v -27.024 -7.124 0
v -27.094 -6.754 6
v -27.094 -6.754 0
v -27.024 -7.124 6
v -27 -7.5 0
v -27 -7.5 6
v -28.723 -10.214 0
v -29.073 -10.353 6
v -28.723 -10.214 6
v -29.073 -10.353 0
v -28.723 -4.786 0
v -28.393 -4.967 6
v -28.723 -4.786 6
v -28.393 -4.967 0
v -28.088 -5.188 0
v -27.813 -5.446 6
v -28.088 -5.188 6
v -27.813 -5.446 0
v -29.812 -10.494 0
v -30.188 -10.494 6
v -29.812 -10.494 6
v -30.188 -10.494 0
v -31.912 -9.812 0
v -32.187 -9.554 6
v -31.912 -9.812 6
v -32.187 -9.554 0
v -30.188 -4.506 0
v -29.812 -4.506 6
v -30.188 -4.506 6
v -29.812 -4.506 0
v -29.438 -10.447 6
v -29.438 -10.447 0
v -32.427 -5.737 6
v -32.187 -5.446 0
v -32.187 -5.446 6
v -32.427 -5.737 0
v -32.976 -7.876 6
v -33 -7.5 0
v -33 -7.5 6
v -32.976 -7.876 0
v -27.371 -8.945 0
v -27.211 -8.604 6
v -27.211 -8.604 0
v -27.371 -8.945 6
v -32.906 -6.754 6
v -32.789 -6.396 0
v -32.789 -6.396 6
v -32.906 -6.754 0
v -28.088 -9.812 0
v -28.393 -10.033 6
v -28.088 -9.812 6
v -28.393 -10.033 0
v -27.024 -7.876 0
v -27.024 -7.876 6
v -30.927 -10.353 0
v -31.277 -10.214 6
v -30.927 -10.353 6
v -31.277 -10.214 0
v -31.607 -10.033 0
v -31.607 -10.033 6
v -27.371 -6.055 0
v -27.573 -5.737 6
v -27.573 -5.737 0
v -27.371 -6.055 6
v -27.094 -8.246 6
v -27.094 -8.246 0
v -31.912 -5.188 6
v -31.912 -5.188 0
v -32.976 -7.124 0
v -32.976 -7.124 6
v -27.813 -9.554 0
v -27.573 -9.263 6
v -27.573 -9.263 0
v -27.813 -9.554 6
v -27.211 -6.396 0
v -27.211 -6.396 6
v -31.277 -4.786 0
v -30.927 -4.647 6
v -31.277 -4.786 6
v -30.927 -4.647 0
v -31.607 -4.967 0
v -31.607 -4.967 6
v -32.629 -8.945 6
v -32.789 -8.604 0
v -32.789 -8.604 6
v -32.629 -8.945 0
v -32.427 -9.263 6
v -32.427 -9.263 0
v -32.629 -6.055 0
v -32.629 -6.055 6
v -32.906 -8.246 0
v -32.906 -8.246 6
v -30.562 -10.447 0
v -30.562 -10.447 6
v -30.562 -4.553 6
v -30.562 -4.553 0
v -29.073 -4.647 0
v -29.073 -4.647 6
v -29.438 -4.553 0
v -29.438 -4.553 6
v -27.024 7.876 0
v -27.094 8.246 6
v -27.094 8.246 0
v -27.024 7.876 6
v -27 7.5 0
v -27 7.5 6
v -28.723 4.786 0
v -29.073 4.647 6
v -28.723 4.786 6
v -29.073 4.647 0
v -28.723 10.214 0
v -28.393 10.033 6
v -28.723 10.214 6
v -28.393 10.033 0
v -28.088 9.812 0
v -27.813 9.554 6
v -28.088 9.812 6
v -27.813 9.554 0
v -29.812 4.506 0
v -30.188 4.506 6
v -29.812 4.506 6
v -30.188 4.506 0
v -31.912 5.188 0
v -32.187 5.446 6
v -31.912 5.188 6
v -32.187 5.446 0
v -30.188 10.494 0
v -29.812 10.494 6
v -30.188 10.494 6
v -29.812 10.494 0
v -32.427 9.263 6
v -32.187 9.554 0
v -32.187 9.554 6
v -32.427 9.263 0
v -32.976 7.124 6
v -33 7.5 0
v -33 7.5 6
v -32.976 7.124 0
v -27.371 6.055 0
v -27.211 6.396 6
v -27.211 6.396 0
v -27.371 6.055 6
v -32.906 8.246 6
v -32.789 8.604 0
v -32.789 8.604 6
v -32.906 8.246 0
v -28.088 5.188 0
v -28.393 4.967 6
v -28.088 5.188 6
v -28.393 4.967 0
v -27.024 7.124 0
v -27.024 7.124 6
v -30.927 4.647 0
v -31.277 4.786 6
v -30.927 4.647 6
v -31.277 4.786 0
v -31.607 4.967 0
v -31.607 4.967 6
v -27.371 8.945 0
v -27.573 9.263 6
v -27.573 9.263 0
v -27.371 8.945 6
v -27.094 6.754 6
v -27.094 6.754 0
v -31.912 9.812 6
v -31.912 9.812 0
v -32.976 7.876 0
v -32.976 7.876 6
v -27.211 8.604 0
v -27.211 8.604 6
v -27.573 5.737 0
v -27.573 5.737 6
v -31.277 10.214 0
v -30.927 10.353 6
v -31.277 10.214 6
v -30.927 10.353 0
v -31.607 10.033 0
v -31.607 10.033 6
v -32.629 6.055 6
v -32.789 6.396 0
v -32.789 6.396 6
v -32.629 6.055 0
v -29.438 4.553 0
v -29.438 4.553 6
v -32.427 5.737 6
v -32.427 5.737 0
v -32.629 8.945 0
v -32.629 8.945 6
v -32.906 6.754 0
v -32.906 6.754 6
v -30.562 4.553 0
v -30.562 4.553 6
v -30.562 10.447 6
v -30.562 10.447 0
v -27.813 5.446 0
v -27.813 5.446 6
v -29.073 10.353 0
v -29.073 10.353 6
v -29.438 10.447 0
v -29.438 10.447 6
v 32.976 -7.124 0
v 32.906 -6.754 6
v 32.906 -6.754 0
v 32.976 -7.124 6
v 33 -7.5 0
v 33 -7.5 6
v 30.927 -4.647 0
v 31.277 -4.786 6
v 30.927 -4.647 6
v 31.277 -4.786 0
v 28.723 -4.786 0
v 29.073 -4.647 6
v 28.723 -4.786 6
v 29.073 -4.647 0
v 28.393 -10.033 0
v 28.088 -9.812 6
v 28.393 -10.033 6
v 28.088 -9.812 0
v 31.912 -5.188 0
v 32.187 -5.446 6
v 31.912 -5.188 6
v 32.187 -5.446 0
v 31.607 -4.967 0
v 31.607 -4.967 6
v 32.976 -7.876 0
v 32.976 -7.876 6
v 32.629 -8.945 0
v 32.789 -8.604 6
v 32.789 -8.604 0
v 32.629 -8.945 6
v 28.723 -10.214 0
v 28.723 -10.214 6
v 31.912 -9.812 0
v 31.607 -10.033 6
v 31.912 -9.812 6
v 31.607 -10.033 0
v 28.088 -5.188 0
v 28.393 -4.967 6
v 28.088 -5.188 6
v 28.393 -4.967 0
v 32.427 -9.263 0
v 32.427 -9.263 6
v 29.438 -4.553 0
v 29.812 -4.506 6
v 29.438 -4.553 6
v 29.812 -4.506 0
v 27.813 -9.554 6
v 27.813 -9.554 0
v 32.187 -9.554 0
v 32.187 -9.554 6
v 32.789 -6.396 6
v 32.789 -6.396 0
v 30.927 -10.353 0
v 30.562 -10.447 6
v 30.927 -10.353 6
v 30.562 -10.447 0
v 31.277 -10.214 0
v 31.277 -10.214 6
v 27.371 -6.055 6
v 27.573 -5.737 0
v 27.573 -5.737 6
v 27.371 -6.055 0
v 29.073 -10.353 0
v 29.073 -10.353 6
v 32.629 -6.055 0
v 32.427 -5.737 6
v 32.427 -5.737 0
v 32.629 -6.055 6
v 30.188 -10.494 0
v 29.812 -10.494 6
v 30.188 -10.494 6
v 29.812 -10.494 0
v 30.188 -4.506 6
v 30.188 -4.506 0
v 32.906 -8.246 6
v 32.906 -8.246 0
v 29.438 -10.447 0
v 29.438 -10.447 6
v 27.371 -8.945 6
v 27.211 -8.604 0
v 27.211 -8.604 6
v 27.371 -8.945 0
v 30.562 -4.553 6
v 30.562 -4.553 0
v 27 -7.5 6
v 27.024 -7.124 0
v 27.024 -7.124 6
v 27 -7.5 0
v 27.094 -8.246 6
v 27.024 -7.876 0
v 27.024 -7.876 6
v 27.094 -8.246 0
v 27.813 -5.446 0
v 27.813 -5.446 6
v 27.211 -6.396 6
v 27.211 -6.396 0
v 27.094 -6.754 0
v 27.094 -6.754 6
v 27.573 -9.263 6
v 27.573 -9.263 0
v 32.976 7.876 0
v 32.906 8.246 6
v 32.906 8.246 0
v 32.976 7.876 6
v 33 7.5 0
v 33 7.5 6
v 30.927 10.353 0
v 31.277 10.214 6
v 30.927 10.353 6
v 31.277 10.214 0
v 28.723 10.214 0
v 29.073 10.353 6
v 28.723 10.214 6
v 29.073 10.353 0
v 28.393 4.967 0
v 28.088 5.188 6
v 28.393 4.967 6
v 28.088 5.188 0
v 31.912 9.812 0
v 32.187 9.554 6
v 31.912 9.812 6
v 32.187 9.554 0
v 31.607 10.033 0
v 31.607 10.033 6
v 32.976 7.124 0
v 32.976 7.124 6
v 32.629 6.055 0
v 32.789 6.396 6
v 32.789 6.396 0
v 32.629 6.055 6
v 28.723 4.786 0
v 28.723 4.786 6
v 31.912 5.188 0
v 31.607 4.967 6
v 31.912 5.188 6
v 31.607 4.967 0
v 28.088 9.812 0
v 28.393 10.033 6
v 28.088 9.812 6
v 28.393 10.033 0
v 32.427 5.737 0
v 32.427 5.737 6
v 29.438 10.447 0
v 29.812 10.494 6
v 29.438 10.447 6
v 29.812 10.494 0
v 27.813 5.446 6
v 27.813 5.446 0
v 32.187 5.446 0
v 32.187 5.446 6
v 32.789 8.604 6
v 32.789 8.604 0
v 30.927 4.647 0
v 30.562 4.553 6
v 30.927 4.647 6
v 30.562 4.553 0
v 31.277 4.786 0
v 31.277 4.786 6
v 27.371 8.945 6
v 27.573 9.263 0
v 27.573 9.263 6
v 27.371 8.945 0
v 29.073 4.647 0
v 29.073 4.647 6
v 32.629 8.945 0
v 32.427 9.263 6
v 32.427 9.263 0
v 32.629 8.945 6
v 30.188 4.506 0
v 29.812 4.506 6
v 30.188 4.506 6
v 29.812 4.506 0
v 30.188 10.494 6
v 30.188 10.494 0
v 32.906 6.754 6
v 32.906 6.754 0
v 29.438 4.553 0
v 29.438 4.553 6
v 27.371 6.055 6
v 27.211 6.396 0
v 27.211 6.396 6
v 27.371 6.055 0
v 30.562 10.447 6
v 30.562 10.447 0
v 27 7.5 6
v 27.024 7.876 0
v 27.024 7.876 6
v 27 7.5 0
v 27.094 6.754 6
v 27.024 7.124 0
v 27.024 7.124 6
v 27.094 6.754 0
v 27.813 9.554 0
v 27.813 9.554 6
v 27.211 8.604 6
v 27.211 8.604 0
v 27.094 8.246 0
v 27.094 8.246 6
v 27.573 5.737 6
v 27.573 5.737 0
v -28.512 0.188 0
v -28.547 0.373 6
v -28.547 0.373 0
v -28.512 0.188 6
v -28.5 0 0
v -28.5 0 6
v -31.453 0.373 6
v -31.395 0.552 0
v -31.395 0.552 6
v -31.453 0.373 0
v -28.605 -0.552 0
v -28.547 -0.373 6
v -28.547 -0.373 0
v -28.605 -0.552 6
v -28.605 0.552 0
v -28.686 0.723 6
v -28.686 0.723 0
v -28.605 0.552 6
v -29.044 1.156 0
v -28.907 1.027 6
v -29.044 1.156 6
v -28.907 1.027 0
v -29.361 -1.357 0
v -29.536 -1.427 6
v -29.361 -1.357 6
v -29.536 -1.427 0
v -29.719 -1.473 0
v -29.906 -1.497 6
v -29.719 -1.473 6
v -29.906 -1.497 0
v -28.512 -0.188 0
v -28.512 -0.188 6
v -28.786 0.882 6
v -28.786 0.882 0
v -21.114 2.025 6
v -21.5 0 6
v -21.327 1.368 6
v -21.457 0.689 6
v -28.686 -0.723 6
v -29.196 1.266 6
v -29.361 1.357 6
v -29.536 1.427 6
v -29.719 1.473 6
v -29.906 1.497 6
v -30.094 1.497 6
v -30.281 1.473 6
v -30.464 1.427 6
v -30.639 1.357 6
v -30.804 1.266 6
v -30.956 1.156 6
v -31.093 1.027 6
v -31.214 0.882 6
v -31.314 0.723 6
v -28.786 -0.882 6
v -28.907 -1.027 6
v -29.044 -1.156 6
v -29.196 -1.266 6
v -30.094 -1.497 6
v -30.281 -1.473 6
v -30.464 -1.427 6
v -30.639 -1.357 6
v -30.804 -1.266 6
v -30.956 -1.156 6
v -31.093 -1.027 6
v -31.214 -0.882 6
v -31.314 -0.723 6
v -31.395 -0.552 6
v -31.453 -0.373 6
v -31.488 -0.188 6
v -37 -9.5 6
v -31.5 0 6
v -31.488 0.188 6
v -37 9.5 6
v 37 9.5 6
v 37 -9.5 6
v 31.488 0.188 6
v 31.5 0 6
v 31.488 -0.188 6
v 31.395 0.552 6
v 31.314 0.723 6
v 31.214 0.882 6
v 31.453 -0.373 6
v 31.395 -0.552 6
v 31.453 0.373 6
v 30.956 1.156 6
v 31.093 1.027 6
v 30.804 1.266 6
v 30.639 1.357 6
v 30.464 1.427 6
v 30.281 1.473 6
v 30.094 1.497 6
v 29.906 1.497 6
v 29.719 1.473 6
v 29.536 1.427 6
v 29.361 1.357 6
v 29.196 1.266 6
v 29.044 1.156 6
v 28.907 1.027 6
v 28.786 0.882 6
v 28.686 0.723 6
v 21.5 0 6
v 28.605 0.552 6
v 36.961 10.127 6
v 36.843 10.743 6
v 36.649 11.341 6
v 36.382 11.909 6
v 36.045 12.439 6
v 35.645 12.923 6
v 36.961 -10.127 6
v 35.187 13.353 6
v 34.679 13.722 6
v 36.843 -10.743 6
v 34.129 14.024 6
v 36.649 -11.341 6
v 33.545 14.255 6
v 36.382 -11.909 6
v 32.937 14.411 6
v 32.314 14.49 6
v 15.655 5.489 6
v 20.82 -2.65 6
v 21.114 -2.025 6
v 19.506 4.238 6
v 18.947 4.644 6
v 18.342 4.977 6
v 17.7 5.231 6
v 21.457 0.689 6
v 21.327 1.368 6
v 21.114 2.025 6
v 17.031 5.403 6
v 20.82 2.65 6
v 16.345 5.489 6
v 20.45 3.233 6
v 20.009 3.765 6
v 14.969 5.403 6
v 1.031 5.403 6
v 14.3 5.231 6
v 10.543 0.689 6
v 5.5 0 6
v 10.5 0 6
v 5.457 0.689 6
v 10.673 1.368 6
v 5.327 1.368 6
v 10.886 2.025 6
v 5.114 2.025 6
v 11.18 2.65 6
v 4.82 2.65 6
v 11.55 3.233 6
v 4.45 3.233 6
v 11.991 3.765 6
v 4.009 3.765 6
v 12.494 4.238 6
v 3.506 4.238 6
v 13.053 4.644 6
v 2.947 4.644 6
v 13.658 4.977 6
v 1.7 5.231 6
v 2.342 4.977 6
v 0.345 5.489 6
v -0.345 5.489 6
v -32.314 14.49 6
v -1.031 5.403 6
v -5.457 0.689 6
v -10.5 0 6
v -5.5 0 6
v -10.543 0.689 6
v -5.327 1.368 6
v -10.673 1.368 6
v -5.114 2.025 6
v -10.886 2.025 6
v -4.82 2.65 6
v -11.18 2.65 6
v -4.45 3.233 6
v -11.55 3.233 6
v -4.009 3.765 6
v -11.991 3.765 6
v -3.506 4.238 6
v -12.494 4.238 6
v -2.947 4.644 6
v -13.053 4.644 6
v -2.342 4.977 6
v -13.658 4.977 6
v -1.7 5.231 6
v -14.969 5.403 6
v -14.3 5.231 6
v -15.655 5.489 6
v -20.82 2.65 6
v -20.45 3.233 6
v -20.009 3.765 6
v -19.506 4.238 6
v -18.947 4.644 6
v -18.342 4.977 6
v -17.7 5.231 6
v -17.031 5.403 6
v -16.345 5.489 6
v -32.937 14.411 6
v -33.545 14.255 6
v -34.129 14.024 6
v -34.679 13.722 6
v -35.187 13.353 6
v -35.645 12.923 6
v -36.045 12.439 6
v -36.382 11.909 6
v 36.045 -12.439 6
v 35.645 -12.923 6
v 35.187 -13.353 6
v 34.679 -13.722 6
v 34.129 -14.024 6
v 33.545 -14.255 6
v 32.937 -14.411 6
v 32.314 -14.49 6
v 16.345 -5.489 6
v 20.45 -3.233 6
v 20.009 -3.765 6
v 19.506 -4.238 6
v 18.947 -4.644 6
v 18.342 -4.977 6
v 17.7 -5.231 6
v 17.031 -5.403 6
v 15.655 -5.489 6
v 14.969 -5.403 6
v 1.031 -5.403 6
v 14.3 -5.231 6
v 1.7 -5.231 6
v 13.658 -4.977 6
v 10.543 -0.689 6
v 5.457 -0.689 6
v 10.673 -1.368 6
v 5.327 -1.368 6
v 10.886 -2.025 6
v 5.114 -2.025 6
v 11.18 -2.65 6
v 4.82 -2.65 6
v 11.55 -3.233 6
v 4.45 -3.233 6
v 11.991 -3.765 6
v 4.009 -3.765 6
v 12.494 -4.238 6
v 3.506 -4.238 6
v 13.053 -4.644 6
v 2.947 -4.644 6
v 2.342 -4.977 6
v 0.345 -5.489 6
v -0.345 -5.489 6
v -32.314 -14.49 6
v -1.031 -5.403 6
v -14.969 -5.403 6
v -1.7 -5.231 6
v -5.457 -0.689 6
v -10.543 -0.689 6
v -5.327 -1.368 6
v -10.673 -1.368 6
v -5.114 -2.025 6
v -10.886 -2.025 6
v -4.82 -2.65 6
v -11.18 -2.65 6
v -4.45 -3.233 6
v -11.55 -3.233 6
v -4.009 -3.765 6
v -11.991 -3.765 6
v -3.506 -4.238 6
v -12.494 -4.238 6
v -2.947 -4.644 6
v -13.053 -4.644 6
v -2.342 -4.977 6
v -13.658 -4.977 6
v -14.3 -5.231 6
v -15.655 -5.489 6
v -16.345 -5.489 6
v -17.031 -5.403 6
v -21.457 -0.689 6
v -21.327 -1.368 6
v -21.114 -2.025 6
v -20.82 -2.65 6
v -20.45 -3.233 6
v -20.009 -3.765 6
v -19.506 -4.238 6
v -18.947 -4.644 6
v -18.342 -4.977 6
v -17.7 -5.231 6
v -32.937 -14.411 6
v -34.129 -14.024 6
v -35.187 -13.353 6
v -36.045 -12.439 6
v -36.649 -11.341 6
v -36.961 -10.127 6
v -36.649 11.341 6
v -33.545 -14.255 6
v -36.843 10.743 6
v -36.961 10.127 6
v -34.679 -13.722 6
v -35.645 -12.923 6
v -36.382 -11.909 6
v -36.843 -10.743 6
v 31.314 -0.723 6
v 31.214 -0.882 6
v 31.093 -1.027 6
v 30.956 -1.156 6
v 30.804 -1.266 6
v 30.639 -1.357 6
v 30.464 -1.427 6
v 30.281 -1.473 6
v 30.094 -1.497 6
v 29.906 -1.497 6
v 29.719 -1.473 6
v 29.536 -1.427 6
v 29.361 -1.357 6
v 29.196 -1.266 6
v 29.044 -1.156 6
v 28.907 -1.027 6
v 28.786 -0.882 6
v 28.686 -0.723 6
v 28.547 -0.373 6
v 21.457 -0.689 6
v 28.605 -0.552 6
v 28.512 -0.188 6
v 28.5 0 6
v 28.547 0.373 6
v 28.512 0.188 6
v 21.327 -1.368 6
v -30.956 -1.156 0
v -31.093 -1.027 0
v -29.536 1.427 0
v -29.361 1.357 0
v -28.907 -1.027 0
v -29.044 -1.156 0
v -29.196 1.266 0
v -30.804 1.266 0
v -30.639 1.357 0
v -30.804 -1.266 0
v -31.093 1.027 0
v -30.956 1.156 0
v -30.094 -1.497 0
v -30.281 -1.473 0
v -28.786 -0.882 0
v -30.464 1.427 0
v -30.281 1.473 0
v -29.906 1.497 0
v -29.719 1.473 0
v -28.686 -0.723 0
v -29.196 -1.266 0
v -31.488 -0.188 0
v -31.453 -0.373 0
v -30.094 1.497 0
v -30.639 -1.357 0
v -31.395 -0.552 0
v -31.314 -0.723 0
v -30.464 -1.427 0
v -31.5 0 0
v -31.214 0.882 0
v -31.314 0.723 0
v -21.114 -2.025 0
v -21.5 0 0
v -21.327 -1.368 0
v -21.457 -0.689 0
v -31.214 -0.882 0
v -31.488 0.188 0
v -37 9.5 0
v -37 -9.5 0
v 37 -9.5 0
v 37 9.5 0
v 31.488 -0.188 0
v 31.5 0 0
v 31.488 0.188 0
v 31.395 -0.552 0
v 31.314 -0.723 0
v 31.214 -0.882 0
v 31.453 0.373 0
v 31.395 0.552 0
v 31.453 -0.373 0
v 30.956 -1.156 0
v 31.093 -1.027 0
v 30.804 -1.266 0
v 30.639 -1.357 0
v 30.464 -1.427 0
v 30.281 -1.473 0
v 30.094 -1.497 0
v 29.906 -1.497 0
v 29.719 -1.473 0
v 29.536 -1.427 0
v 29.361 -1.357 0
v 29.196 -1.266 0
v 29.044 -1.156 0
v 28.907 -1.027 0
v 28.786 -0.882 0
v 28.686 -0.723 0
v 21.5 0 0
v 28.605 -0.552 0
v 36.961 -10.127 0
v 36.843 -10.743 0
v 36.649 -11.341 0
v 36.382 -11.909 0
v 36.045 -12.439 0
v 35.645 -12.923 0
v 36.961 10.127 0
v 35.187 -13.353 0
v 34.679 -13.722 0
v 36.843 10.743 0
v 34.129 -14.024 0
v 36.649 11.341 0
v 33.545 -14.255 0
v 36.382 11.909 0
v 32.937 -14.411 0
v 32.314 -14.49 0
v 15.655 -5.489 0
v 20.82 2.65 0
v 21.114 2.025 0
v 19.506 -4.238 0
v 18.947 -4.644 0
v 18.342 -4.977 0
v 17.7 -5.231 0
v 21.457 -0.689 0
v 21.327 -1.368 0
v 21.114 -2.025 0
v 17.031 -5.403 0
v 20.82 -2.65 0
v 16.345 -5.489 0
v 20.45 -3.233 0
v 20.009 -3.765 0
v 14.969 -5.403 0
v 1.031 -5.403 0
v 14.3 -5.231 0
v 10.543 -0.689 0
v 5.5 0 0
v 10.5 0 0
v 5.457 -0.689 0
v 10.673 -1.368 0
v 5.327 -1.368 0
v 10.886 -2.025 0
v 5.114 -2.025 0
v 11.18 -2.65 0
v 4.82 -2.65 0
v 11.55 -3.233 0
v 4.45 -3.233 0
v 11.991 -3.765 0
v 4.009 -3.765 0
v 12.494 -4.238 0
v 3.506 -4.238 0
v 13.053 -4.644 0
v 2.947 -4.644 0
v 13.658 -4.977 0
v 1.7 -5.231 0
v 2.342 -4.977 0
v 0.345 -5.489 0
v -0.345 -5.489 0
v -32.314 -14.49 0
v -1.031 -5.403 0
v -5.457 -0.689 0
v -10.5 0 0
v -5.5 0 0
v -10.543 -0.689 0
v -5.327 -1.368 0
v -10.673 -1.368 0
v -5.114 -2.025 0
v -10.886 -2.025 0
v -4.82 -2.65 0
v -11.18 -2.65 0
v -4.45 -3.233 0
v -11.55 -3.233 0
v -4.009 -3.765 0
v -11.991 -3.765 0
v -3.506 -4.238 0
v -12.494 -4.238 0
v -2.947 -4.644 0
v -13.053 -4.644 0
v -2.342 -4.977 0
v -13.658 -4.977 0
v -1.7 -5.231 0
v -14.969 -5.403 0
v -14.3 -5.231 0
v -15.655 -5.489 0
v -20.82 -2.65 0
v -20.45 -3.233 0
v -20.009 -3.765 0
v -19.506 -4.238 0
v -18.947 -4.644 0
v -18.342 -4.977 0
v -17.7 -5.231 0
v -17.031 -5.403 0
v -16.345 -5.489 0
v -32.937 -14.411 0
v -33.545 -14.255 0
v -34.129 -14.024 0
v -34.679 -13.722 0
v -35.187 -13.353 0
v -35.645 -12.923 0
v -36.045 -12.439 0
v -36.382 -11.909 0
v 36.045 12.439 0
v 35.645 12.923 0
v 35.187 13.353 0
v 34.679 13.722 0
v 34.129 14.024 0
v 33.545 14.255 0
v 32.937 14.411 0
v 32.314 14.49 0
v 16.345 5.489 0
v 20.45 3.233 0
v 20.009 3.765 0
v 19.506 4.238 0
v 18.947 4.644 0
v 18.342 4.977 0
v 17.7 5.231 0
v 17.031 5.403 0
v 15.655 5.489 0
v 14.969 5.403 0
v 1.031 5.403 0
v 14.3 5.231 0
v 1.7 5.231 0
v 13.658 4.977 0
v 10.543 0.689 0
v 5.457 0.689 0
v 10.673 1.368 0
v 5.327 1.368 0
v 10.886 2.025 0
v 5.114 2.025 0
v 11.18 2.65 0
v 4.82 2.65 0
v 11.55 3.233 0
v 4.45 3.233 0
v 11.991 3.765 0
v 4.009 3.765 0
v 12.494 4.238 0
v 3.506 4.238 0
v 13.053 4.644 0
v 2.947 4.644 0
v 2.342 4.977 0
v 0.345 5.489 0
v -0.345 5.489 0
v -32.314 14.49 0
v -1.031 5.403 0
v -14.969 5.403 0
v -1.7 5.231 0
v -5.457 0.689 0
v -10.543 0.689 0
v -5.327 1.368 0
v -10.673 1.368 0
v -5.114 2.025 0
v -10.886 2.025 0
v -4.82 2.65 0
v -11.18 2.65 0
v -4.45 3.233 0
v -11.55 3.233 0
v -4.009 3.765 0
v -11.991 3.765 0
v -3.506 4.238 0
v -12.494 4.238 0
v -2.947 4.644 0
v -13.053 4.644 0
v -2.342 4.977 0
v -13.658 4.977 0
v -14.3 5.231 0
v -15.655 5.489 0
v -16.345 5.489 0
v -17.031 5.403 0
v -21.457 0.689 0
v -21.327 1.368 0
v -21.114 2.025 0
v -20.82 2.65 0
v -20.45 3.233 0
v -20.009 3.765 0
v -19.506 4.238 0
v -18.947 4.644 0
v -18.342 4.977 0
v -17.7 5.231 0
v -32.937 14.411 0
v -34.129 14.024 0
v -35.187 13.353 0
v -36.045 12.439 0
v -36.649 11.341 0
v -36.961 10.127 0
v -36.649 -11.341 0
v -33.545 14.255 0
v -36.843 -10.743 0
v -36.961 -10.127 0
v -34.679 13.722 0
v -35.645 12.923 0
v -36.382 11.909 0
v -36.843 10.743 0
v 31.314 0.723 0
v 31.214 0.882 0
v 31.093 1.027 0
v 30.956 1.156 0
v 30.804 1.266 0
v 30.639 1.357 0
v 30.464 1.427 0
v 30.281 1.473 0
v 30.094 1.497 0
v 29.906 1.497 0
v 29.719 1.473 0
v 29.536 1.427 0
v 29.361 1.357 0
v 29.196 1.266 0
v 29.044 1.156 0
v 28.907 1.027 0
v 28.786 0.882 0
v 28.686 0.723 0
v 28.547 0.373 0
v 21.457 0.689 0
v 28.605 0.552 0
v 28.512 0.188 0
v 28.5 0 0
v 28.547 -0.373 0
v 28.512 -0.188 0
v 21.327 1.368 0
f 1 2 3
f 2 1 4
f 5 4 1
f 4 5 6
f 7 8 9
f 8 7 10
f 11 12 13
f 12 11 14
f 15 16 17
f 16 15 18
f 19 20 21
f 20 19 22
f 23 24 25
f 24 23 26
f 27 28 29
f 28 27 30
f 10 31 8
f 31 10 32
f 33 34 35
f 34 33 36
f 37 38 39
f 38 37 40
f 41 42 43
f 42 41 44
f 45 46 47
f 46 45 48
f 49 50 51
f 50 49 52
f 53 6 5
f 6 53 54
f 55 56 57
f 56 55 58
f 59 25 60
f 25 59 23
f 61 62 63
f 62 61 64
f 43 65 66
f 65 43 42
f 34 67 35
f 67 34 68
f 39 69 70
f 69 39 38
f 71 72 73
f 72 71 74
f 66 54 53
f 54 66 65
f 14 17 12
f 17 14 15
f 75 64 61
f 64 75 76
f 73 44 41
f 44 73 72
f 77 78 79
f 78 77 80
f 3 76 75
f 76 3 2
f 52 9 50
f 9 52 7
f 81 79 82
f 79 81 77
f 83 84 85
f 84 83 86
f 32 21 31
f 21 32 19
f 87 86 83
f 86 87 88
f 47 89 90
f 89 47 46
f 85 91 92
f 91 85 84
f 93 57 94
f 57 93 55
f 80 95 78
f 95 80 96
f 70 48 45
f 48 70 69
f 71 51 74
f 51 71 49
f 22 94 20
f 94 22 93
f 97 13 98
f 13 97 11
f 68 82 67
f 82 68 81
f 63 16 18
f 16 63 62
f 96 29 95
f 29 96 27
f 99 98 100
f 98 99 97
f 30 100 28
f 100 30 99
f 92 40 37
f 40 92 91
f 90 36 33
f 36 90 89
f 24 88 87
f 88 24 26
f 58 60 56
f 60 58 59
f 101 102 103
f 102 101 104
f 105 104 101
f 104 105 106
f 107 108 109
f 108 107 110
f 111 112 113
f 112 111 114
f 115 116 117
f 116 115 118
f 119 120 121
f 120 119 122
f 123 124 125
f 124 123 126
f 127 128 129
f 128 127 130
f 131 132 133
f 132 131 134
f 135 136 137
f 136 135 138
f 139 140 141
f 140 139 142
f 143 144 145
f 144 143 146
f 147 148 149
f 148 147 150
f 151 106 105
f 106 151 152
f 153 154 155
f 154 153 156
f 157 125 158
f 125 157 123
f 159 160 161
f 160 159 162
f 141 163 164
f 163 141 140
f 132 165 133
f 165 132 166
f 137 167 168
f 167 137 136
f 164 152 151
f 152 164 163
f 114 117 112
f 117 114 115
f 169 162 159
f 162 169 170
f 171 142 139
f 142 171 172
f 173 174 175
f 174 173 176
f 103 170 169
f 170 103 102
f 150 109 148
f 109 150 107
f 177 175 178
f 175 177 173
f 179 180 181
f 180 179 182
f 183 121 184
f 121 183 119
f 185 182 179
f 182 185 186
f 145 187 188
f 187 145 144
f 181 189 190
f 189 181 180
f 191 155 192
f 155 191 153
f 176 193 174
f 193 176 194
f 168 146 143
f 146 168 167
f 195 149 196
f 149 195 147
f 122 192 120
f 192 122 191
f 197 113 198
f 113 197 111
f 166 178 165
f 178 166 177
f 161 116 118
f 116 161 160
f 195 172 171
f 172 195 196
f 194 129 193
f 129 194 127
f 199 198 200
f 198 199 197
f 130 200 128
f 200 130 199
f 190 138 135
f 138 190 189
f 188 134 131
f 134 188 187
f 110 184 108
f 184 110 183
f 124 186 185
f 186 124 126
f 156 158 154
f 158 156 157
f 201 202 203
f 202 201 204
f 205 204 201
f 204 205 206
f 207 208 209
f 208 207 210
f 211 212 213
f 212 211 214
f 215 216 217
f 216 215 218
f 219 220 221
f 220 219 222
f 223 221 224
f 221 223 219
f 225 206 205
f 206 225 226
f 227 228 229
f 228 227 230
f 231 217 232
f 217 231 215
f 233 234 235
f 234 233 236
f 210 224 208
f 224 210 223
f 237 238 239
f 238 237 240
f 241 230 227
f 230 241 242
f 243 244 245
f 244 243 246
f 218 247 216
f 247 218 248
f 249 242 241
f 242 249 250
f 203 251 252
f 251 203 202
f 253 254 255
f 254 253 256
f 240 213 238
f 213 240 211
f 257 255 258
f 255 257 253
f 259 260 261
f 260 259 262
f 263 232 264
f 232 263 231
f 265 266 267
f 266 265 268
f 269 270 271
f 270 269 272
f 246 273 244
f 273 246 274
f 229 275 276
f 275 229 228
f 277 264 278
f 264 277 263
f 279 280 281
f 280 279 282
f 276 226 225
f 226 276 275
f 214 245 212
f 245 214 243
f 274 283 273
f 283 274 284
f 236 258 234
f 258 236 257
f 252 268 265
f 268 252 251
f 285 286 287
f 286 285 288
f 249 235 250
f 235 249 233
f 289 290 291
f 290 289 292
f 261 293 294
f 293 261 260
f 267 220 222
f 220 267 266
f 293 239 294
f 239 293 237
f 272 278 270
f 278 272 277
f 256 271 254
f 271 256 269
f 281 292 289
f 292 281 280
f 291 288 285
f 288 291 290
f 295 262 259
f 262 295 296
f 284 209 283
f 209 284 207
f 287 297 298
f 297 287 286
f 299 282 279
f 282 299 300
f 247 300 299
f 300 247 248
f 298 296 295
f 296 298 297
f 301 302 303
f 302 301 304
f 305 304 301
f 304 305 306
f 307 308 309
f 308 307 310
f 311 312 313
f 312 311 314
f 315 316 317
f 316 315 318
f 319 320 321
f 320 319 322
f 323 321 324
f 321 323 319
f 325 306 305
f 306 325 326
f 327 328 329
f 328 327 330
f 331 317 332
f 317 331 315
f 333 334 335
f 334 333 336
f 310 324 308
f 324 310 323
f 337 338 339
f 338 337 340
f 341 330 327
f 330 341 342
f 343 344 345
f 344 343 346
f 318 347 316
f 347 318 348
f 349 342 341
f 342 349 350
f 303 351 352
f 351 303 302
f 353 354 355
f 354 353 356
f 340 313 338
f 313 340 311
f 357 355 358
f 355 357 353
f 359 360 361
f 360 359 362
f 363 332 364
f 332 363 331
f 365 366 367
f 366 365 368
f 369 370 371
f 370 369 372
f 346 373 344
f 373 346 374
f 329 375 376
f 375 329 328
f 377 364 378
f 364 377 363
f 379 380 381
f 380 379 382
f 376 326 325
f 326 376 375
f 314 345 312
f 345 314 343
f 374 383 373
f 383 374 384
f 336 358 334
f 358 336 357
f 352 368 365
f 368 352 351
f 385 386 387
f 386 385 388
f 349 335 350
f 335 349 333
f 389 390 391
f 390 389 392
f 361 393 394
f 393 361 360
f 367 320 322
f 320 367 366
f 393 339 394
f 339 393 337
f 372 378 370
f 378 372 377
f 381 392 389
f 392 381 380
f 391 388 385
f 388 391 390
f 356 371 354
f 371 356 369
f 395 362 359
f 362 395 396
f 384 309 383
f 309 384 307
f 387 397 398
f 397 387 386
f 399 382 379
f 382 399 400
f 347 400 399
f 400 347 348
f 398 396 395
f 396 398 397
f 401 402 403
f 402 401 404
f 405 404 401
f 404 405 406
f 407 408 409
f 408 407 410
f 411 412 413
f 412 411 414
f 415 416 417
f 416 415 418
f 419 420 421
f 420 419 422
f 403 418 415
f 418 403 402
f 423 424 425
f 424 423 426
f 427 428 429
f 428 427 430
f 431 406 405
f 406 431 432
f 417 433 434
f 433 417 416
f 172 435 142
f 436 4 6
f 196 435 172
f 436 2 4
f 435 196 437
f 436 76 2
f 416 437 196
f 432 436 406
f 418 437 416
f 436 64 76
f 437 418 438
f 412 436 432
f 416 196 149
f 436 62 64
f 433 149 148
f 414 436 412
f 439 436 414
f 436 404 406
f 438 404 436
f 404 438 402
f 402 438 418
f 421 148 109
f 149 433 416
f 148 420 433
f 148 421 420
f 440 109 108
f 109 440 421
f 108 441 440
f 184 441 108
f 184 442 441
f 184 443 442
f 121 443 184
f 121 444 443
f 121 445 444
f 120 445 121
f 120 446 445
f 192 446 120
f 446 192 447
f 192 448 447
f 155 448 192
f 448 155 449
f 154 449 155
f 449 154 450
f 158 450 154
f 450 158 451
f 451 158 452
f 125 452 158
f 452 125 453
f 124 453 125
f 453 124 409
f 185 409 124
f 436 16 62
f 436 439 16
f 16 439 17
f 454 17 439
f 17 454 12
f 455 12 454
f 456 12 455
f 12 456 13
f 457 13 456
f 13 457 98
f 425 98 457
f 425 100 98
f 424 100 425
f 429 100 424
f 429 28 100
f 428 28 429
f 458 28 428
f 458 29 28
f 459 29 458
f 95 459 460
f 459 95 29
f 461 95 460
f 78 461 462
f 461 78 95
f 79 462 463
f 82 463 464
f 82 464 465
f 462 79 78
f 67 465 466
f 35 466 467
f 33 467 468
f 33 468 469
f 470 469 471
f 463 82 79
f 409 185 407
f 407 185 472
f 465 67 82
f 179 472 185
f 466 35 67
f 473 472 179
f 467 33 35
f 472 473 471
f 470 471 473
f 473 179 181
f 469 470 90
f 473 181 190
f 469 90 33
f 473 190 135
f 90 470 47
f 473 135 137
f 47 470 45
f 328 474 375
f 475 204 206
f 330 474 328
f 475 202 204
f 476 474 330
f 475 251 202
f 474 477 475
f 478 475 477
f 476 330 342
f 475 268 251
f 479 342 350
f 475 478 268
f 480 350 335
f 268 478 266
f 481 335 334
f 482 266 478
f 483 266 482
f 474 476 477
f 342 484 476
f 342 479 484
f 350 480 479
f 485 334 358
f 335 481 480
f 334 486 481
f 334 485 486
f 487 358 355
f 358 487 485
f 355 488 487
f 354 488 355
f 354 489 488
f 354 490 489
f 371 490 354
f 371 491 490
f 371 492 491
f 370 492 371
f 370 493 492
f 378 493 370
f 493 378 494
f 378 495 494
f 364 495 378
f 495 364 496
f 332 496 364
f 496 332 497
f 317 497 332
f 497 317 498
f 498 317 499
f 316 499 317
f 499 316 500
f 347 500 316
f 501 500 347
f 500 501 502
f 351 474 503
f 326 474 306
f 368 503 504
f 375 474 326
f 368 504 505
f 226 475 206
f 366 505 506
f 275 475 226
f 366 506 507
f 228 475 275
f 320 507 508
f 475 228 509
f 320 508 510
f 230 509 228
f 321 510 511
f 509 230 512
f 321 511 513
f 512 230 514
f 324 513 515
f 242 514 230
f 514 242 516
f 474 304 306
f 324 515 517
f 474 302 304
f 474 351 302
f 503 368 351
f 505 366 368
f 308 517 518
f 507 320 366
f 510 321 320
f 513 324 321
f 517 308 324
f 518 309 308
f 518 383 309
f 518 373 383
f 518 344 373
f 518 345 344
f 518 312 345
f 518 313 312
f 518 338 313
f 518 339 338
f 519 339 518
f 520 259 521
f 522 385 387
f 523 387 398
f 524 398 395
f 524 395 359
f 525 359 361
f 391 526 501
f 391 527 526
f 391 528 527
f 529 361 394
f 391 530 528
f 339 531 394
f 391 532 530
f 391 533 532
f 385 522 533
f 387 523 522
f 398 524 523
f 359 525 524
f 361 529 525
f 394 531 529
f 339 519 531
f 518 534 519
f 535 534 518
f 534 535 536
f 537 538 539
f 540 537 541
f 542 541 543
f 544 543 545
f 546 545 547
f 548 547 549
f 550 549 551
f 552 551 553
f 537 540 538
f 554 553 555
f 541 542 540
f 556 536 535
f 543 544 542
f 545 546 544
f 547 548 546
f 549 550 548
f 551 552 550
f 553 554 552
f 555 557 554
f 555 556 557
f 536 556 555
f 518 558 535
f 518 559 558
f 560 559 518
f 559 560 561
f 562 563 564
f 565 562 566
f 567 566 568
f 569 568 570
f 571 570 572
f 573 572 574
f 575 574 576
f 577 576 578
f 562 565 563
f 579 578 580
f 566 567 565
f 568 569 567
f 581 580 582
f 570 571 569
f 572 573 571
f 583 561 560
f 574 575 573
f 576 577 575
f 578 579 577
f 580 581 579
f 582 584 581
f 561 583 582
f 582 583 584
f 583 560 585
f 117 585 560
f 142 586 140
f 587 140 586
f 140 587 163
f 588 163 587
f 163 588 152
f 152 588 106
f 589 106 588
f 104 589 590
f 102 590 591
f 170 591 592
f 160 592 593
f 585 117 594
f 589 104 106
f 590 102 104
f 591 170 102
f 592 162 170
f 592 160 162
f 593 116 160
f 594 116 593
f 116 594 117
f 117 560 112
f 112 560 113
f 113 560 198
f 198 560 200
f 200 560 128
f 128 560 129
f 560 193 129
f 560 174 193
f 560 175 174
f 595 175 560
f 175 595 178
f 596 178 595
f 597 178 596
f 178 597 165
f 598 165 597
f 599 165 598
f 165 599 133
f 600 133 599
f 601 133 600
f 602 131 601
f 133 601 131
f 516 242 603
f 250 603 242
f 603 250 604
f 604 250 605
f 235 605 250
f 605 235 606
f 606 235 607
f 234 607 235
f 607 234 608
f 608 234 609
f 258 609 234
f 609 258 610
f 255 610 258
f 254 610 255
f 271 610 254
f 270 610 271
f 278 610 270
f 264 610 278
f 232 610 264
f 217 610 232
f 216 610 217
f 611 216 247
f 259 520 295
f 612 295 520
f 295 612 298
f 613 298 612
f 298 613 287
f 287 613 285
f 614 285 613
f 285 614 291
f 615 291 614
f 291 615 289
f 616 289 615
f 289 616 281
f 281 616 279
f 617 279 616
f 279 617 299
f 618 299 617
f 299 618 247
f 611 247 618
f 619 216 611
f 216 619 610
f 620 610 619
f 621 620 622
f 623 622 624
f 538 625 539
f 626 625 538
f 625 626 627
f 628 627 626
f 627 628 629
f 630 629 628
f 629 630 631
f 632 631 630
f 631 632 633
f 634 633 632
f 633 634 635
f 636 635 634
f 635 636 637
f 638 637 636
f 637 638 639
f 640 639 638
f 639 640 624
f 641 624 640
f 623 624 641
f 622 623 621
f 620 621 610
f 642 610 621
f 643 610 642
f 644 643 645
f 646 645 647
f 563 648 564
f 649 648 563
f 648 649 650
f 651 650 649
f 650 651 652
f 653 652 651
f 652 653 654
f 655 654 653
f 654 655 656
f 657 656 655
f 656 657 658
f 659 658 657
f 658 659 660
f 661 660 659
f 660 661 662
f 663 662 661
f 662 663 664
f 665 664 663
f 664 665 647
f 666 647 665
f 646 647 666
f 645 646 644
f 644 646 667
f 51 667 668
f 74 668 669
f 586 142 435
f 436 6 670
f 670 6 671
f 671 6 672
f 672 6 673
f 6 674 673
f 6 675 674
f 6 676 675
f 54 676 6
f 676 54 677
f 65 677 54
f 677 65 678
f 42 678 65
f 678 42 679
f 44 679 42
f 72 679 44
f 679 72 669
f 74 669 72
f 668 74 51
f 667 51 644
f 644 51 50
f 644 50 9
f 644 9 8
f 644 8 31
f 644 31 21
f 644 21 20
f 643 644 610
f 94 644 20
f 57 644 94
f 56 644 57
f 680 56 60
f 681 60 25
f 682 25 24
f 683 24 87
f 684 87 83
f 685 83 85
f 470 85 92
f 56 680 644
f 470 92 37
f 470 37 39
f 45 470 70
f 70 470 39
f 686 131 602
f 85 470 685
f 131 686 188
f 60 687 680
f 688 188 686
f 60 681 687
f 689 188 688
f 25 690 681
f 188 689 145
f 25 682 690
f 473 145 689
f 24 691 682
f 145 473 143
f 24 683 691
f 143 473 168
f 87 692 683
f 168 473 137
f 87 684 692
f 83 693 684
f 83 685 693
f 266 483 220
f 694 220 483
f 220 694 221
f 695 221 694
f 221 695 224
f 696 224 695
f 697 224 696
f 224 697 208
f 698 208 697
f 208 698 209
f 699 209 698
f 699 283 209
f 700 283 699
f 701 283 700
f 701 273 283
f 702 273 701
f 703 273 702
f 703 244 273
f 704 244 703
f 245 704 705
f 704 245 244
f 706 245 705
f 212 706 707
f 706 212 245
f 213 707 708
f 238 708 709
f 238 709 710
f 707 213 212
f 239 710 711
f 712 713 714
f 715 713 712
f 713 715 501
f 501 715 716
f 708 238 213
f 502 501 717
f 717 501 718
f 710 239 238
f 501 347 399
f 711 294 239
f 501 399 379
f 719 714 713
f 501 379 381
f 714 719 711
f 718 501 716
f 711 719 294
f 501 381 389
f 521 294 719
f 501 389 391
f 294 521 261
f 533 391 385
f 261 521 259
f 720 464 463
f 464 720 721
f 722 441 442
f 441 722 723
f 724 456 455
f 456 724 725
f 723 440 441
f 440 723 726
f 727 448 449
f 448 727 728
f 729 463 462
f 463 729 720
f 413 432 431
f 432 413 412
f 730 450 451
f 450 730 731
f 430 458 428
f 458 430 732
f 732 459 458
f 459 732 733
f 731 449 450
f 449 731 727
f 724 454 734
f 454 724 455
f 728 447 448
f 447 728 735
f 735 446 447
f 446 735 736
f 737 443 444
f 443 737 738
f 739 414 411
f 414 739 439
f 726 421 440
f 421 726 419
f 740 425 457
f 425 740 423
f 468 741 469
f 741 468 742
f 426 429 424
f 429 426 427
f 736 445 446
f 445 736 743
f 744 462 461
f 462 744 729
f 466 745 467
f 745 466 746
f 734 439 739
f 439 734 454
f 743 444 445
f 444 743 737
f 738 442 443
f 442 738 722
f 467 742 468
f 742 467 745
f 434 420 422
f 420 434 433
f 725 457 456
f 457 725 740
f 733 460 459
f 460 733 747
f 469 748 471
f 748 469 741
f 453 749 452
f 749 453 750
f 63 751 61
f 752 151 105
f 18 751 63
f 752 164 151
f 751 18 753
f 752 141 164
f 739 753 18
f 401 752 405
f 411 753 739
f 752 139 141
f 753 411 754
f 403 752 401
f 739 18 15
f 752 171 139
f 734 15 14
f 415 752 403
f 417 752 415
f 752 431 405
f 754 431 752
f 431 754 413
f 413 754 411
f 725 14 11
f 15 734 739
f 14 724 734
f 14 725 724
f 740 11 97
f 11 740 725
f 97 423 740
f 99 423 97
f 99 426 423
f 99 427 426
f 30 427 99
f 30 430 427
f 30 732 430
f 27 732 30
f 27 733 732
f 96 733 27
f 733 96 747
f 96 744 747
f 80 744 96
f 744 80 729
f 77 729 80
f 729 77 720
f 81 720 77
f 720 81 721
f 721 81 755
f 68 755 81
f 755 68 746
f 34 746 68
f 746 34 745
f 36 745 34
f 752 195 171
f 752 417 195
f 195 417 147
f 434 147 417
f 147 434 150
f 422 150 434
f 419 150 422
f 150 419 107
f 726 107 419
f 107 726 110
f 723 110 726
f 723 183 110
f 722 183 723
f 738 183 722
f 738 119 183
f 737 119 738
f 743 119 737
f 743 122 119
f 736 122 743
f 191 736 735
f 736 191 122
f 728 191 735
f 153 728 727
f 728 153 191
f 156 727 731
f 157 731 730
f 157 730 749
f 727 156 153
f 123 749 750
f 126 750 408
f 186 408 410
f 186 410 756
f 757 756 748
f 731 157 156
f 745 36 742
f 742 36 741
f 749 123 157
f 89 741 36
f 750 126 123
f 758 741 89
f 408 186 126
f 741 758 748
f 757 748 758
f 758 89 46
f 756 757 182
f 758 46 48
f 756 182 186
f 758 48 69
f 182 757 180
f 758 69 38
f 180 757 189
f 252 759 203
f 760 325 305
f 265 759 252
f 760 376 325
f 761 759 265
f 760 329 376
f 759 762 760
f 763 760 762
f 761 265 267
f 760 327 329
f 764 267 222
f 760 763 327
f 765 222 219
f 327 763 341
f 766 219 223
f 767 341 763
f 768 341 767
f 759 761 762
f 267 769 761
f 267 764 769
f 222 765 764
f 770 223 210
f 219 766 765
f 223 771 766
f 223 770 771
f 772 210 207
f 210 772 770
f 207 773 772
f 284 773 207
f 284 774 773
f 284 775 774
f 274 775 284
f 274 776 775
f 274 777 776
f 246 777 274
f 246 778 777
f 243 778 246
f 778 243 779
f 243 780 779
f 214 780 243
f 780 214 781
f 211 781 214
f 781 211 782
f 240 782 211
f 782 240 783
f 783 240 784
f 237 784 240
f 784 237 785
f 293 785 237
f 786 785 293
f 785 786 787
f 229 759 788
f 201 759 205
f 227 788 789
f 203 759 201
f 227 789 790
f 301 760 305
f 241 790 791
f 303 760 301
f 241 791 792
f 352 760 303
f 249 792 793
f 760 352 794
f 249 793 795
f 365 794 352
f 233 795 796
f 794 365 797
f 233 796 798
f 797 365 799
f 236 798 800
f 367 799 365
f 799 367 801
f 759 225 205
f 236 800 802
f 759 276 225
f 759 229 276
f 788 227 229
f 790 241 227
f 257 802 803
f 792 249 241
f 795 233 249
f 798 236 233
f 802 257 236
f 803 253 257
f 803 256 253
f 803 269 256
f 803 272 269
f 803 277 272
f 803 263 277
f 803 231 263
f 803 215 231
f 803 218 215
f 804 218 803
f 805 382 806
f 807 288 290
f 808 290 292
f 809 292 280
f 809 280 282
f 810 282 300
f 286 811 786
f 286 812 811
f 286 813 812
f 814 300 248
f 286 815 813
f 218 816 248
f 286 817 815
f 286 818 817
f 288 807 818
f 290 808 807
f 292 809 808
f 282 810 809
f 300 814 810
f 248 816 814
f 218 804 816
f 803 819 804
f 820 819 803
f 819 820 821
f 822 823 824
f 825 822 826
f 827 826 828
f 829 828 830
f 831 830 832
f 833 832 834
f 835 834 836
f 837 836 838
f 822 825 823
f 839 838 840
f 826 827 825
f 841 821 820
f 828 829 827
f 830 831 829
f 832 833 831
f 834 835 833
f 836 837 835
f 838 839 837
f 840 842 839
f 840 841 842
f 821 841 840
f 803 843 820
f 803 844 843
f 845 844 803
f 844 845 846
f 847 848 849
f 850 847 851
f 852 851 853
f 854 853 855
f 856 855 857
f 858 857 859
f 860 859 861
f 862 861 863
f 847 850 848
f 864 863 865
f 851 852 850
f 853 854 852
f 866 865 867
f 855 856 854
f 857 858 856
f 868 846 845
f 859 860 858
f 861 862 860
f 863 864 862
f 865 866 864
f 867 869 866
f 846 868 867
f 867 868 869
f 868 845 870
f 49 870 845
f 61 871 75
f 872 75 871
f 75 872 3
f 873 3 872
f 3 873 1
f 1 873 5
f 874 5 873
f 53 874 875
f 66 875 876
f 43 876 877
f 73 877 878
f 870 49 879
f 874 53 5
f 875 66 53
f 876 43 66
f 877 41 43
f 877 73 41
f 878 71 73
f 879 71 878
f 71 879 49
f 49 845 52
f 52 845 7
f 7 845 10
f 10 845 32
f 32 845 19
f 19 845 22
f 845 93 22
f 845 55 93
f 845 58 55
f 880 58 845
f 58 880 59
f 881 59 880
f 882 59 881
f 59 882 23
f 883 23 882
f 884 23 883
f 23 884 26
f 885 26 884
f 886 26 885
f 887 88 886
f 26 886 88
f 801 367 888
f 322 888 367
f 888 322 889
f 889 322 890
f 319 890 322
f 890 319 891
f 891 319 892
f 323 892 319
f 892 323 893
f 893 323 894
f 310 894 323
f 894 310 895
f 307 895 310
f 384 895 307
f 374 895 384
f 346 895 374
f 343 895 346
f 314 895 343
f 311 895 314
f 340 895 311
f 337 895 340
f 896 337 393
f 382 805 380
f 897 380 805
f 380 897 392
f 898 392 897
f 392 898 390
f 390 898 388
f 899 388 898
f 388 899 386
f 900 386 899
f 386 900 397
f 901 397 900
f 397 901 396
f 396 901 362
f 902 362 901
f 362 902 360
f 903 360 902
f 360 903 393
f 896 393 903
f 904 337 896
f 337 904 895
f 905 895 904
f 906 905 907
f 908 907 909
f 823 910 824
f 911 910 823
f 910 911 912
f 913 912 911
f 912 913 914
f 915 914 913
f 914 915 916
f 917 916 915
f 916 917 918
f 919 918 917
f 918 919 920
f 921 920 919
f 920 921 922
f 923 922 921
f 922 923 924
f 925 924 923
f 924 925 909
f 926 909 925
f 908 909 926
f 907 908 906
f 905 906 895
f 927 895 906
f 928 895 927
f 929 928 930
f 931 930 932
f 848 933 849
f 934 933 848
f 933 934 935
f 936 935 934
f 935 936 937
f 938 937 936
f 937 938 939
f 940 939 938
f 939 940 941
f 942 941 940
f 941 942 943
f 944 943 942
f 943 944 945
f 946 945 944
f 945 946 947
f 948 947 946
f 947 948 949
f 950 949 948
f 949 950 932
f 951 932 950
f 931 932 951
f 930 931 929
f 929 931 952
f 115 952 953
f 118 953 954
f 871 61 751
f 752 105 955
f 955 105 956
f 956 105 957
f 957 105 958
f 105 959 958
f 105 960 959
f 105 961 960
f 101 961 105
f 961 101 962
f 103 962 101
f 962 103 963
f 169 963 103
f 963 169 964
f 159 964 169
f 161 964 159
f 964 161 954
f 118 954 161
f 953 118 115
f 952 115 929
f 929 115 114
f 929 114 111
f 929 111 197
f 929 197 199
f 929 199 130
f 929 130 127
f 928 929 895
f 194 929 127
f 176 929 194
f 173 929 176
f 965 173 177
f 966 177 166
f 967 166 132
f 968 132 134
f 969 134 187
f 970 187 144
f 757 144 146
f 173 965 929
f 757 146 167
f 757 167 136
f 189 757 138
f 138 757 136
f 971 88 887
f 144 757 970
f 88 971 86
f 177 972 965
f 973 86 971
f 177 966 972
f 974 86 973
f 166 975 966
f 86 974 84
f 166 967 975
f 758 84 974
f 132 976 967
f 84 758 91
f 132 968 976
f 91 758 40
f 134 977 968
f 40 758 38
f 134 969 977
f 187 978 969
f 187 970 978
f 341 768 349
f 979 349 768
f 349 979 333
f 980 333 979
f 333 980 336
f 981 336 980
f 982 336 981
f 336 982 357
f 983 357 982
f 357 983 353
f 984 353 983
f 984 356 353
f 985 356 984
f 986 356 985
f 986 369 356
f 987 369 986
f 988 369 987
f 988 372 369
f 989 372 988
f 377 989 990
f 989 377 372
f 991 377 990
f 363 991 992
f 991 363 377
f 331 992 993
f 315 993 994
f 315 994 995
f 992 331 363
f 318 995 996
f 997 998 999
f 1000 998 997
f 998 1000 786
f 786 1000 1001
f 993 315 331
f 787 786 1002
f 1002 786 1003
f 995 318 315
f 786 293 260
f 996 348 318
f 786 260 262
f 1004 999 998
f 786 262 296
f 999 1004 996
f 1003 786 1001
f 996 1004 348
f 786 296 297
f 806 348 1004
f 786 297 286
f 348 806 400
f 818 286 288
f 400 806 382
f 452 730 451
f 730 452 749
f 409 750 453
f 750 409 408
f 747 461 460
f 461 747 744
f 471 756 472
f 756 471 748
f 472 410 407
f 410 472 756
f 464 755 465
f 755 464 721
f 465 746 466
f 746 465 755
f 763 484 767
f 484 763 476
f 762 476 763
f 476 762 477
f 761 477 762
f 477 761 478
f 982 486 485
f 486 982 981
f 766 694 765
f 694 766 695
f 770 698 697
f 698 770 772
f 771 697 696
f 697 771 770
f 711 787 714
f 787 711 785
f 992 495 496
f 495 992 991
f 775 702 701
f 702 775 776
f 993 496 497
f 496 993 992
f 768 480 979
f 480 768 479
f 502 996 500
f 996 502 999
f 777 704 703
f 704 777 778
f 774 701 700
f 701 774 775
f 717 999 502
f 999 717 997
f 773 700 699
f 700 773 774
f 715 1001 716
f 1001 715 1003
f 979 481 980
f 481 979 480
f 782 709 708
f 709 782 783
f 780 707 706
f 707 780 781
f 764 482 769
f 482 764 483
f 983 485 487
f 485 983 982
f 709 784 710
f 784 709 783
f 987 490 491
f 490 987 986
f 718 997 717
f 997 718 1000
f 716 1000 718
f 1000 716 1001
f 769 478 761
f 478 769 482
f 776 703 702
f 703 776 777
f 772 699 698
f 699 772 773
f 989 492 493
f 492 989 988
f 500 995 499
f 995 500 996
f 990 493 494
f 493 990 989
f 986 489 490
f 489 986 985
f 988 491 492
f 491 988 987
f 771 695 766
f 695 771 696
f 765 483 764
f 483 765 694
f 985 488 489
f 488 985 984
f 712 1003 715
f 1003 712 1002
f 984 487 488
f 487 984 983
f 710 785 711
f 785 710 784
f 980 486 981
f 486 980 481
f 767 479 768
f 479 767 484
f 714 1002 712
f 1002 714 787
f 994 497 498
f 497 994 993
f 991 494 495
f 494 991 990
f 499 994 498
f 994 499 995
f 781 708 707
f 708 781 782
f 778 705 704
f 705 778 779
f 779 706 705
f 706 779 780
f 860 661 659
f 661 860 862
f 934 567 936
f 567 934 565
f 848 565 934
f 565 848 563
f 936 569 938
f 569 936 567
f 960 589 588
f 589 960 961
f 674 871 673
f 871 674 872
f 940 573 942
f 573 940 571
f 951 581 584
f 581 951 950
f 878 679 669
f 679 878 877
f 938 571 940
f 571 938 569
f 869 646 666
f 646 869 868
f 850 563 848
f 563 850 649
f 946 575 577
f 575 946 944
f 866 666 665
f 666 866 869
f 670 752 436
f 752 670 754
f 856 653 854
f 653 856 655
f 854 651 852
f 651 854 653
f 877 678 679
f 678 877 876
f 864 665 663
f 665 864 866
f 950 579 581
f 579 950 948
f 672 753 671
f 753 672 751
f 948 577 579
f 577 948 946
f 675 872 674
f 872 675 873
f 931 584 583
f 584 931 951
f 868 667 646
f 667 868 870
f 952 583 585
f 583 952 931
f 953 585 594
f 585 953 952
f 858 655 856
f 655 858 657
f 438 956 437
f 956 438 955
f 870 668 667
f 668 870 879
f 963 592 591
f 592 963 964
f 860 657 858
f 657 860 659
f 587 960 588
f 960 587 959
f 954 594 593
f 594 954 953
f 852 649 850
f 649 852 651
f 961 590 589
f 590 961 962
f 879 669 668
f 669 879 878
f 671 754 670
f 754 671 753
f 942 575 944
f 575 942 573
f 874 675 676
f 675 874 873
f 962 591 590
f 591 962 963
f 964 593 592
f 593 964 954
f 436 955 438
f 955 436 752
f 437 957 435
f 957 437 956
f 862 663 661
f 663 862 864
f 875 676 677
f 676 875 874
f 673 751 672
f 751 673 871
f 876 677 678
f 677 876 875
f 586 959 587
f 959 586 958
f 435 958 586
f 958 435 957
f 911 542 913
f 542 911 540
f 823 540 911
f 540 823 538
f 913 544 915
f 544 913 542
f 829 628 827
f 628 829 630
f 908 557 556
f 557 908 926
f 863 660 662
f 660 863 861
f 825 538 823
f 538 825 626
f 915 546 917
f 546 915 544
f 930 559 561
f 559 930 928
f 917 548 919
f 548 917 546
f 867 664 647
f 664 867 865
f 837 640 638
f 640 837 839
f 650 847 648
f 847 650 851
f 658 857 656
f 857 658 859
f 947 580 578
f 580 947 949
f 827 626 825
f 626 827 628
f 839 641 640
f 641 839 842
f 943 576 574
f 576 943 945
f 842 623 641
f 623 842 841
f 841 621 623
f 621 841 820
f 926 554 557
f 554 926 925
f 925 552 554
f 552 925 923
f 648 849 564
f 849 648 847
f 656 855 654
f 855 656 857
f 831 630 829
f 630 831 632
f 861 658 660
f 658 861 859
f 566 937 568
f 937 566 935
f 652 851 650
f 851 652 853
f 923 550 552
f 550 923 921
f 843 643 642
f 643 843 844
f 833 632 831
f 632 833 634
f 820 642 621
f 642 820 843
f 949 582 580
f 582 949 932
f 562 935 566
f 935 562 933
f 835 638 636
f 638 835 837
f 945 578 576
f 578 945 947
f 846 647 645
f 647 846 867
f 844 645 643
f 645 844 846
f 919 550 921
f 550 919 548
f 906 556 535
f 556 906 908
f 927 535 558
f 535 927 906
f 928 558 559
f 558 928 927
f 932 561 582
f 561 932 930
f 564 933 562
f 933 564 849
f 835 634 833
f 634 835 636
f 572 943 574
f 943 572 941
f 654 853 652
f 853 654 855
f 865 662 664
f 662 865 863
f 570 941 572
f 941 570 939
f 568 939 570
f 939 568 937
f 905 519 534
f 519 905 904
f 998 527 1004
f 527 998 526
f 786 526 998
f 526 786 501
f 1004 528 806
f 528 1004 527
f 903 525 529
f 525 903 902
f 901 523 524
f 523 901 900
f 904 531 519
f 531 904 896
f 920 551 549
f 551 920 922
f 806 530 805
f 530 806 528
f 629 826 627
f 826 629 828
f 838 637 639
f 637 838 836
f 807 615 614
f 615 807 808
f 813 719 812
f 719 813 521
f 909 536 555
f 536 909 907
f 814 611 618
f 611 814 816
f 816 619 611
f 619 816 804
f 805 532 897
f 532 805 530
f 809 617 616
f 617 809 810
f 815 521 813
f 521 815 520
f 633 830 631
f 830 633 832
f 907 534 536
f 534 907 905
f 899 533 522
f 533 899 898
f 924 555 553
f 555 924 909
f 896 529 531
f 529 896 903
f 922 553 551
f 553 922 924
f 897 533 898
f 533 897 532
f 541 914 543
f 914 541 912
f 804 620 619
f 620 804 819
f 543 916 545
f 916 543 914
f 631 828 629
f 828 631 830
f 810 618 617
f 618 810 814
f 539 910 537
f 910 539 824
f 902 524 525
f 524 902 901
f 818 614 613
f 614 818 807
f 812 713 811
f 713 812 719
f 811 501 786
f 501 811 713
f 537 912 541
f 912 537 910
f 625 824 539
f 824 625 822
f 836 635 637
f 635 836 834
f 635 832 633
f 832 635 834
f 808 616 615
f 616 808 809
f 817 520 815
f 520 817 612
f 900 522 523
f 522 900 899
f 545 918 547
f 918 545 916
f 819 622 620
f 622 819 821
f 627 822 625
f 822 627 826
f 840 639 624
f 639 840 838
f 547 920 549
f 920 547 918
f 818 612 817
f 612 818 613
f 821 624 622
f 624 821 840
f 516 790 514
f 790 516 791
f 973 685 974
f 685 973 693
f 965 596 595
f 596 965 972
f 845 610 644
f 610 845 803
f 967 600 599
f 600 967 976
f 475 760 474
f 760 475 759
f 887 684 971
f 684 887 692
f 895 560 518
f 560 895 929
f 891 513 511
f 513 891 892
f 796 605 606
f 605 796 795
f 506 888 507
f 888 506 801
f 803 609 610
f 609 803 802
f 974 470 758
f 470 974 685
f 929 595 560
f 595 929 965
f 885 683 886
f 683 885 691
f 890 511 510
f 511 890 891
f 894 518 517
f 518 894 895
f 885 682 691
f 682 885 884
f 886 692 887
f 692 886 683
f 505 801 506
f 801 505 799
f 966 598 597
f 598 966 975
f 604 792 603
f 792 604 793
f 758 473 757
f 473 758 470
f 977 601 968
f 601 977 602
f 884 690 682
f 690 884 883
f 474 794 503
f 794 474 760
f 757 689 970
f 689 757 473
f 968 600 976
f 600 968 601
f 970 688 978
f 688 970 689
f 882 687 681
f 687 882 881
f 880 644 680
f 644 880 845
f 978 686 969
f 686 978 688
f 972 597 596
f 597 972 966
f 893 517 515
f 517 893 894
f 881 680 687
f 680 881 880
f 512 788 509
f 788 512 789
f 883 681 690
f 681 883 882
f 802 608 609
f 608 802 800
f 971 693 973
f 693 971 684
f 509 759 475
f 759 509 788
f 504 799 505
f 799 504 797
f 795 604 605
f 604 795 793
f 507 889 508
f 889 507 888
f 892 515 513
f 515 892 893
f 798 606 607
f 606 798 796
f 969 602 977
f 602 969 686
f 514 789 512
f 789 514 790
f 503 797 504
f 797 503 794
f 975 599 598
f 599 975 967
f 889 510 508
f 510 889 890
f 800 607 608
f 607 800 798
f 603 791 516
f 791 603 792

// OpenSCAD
$fn = 50;


difference() {
	union() {
		hull() {
			translate(v = [-32.0000000000, 9.5000000000, 0]) {
				cylinder(h = 6, r = 5);
			}
			translate(v = [32.0000000000, 9.5000000000, 0]) {
				cylinder(h = 6, r = 5);
			}
			translate(v = [-32.0000000000, -9.5000000000, 0]) {
				cylinder(h = 6, r = 5);
			}
			translate(v = [32.0000000000, -9.5000000000, 0]) {
				cylinder(h = 6, r = 5);
			}
		}
	}
	union() {
		#translate(v = [-30.0000000000, -7.5000000000, 0]) {
			cylinder(h = 6, r = 3.0000000000);
		}
		#translate(v = [-30.0000000000, 7.5000000000, 0]) {
			cylinder(h = 6, r = 3.0000000000);
		}
		#translate(v = [30.0000000000, -7.5000000000, 0]) {
			cylinder(h = 6, r = 3.0000000000);
		}
		#translate(v = [30.0000000000, 7.5000000000, 0]) {
			cylinder(h = 6, r = 3.0000000000);
		}
		#translate(v = [-30.0000000000, -7.5000000000, -100.0000000000]) {
			cylinder(h = 200, r = 3.0000000000);
		}
		#translate(v = [-30.0000000000, 7.5000000000, -100.0000000000]) {
			cylinder(h = 200, r = 3.0000000000);
		}
		#translate(v = [30.0000000000, -7.5000000000, -100.0000000000]) {
			cylinder(h = 200, r = 3.0000000000);
		}
		#translate(v = [30.0000000000, 7.5000000000, -100.0000000000]) {
			cylinder(h = 200, r = 3.0000000000);
		}
		#translate(v = [-30.0000000000, -7.5000000000, 0]) {
			cylinder(h = 6, r = 1.5000000000);
		}
		#translate(v = [-30.0000000000, 0.0000000000, 0]) {
			cylinder(h = 6, r = 1.5000000000);
		}
		#translate(v = [-30.0000000000, 7.5000000000, 0]) {
			cylinder(h = 6, r = 1.5000000000);
		}
		#translate(v = [30.0000000000, -7.5000000000, 0]) {
			cylinder(h = 6, r = 1.5000000000);
		}
		#translate(v = [30.0000000000, 0.0000000000, 0]) {
			cylinder(h = 6, r = 1.5000000000);
		}
		#translate(v = [30.0000000000, 7.5000000000, 0]) {
			cylinder(h = 6, r = 1.5000000000);
		}
		#translate(v = [-30.0000000000, -7.5000000000, 0]) {
			cylinder(h = 6, r = 1.5000000000);
		}
		#translate(v = [-30.0000000000, 0.0000000000, 0]) {
			cylinder(h = 6, r = 1.5000000000);
		}
		#translate(v = [-30.0000000000, 7.5000000000, 0]) {
			cylinder(h = 6, r = 1.5000000000);
		}
		#translate(v = [30.0000000000, -7.5000000000, 0]) {
			cylinder(h = 6, r = 1.5000000000);
		}
		#translate(v = [30.0000000000, 0.0000000000, 0]) {
			cylinder(h = 6, r = 1.5000000000);
		}
		#translate(v = [30.0000000000, 7.5000000000, 0]) {
			cylinder(h = 6, r = 1.5000000000);
		}
		#translate(v = [-30.0000000000, -7.5000000000, 0]) {
			cylinder(h = 6, r = 1.5000000000);
		}
		#translate(v = [-30.0000000000, 0.0000000000, 0]) {
			cylinder(h = 6, r = 1.5000000000);
		}
		#translate(v = [-30.0000000000, 7.5000000000, 0]) {
			cylinder(h = 6, r = 1.5000000000);
		}
		#translate(v = [30.0000000000, -7.5000000000, 0]) {
			cylinder(h = 6, r = 1.5000000000);
		}
		#translate(v = [30.0000000000, 0.0000000000, 0]) {
			cylinder(h = 6, r = 1.5000000000);
		}
		#translate(v = [30.0000000000, 7.5000000000, 0]) {
			cylinder(h = 6, r = 1.5000000000);
		}
		#translate(v = [-16.0000000000, 0, 0]) {
			cylinder(h = 6, r = 5.5000000000);
		}
		#cylinder(h = 6, r = 5.5000000000);
		#translate(v = [16.0000000000, 0, 0]) {
			cylinder(h = 6, r = 5.5000000000);
		}
	}
}
